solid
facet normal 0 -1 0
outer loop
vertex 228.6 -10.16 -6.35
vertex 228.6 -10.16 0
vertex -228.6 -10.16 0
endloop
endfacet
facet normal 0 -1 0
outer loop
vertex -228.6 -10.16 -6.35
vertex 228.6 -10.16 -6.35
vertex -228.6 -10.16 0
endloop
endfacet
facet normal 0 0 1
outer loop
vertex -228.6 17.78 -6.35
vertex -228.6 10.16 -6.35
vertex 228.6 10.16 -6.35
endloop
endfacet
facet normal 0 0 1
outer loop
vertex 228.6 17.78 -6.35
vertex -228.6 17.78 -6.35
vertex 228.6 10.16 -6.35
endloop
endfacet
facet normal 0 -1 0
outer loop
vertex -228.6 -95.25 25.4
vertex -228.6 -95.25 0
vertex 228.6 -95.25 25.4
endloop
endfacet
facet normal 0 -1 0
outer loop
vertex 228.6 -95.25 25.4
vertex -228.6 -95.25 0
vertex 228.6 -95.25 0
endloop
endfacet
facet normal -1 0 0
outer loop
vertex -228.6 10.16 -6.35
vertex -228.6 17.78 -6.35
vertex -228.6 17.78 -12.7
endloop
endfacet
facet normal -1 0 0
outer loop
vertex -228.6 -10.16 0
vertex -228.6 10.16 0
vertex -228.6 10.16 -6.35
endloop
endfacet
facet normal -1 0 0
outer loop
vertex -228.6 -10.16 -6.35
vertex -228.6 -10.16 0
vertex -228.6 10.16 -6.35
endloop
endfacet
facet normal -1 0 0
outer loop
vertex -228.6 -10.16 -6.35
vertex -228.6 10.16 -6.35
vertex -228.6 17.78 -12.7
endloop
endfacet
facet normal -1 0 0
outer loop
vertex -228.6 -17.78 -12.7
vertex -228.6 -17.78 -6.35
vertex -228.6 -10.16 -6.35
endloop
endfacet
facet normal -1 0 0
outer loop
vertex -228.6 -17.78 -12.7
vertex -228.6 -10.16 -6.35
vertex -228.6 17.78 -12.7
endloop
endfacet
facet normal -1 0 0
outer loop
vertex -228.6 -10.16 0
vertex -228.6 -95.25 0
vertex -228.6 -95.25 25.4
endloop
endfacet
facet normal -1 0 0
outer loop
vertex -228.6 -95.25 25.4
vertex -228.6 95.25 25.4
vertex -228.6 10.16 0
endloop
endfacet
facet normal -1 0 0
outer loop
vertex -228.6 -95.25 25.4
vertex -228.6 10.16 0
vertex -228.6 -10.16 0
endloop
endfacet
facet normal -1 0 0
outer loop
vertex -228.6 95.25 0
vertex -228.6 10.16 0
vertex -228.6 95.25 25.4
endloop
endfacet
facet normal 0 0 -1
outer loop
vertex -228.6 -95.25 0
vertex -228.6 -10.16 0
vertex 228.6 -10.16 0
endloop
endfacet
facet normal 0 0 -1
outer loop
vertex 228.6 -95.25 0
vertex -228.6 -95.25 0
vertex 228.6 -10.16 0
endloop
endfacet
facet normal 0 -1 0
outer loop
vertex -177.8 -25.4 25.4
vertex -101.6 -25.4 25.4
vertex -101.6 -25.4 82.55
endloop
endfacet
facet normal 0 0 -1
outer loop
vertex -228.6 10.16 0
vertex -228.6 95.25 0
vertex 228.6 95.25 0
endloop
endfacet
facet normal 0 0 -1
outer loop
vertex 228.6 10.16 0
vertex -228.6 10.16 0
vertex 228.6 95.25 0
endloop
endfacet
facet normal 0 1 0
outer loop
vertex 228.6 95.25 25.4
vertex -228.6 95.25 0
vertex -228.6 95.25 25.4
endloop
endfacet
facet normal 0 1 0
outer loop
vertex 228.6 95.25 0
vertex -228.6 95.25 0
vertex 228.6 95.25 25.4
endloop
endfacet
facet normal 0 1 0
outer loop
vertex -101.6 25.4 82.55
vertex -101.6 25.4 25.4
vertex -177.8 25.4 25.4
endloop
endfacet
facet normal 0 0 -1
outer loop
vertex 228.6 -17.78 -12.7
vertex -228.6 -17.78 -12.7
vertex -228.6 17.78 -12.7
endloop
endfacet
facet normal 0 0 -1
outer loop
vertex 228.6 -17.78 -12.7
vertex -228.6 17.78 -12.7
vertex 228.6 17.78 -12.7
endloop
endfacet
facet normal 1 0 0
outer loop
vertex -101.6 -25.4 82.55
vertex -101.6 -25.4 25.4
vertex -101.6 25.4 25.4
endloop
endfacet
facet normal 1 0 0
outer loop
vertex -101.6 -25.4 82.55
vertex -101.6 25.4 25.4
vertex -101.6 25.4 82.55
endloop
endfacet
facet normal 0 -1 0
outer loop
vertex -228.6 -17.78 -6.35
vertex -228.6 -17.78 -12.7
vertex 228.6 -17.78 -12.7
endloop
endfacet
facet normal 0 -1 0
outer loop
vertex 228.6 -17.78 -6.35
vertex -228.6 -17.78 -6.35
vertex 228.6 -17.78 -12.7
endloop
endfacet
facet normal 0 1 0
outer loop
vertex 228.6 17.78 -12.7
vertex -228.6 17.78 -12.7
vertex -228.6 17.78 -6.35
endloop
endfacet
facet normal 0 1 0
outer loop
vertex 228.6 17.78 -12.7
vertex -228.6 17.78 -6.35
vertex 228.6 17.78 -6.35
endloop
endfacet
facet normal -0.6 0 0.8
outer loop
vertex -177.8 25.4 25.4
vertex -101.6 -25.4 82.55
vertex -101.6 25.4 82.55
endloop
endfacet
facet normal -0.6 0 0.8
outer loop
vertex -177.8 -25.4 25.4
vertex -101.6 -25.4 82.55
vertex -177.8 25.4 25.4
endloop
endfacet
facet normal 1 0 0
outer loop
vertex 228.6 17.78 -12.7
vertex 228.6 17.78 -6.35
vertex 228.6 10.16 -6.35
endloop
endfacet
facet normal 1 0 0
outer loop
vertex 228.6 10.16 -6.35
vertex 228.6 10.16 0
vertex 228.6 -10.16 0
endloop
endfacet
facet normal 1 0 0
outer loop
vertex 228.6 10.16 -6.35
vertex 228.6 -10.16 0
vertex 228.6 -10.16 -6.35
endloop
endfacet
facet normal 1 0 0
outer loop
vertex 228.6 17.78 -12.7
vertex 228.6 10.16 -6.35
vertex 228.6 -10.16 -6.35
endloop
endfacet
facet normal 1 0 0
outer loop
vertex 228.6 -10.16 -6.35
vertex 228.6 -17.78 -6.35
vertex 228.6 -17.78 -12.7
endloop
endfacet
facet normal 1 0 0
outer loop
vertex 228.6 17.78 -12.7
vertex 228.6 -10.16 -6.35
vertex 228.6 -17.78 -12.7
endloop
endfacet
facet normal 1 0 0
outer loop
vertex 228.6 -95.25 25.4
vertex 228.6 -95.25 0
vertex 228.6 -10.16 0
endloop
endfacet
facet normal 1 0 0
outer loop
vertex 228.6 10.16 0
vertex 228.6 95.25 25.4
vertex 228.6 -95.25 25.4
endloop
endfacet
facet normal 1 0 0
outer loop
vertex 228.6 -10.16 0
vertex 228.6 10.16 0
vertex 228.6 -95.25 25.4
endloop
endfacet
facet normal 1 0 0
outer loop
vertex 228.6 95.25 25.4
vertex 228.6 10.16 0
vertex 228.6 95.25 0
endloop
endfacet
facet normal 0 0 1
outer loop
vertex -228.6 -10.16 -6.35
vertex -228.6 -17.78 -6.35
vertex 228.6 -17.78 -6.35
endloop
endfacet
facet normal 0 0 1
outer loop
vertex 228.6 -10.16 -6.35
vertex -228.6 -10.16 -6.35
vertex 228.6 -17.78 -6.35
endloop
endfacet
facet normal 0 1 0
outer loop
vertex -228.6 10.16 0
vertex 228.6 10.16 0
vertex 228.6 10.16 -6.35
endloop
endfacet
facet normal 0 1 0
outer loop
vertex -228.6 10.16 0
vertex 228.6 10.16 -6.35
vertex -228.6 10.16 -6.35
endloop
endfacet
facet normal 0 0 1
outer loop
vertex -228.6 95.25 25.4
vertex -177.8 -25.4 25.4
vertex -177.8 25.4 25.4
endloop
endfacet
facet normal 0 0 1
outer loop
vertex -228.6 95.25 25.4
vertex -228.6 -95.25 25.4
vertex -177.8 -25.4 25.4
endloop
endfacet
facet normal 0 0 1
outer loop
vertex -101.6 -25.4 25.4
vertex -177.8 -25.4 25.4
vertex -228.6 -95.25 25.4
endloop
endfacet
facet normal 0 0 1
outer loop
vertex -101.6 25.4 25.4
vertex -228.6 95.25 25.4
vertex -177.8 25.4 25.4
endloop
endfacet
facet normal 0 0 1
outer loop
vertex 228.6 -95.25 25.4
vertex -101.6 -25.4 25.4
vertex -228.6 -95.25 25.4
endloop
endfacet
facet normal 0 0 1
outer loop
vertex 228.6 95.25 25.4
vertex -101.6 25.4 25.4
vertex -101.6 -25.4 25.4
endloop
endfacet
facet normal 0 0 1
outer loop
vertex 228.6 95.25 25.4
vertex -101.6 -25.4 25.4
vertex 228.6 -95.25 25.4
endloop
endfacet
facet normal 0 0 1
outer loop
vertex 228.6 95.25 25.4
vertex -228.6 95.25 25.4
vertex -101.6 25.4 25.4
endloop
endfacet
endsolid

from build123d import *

# Parameters (mm, degrees)
SKETCH1_W                = 457.2
SKETCH1_H                = 190.5
BOSS_EXTRUDE1_DEPTH      = 25.4
SKETCH2_W                = 457.2
SKETCH2_H                = 20.32
BOSS_EXTRUDE2_DEPTH      = 12.7
BOSS_EXTRUDE3_DEPTH      = 7.62
BOSS_EXTRUDE3_DEPTH_BACK = 27.94
SKETCH3_W                = 457.2
SKETCH3_H                = 6.35
BOSS_EXTRUDE5_DEPTH      = 25.4
BOSS_EXTRUDE5_DEPTH_BACK = 25.4


with BuildPart() as part:
    # Sketch1 → Boss-Extrude1 (new body)
    with BuildSketch(Plane.XY):
        Rectangle(SKETCH1_W, SKETCH1_H)
    extrude(amount=BOSS_EXTRUDE1_DEPTH)

    # Sketch2 → Boss-Extrude2 (add)
    with BuildSketch(Plane(origin=(0, 0, 0), x_dir=(-1, 0, 0), z_dir=(0, 0, -1))):
        Rectangle(SKETCH2_W, SKETCH2_H)
    extrude(amount=BOSS_EXTRUDE2_DEPTH)

    # Sketch3 → Boss-Extrude3 (add, two sides: drawn at the far end of the back side and taken through both)
    with BuildSketch(Plane(origin=(0, 10.16, 0), x_dir=(1, 0, 0), z_dir=(0, 1, 0)).offset(-BOSS_EXTRUDE3_DEPTH_BACK)):
        with Locations((0, 9.525)):
            Rectangle(SKETCH3_W, SKETCH3_H)
    extrude(amount=BOSS_EXTRUDE3_DEPTH + BOSS_EXTRUDE3_DEPTH_BACK)

    # Sketch5 → Boss-Extrude5 (add, two sides: drawn at the far end of the back side and taken through both)
    with BuildSketch(Plane(origin=(0, 0, 0), x_dir=(1, 0, 0), z_dir=(0, 1, 0)).offset(-BOSS_EXTRUDE5_DEPTH_BACK)):
        Polygon((-177.8, -25.4), (-101.6, -25.4), (-101.6, -82.55), align=None)
    extrude(amount=BOSS_EXTRUDE5_DEPTH + BOSS_EXTRUDE5_DEPTH_BACK)


solid = part.part
